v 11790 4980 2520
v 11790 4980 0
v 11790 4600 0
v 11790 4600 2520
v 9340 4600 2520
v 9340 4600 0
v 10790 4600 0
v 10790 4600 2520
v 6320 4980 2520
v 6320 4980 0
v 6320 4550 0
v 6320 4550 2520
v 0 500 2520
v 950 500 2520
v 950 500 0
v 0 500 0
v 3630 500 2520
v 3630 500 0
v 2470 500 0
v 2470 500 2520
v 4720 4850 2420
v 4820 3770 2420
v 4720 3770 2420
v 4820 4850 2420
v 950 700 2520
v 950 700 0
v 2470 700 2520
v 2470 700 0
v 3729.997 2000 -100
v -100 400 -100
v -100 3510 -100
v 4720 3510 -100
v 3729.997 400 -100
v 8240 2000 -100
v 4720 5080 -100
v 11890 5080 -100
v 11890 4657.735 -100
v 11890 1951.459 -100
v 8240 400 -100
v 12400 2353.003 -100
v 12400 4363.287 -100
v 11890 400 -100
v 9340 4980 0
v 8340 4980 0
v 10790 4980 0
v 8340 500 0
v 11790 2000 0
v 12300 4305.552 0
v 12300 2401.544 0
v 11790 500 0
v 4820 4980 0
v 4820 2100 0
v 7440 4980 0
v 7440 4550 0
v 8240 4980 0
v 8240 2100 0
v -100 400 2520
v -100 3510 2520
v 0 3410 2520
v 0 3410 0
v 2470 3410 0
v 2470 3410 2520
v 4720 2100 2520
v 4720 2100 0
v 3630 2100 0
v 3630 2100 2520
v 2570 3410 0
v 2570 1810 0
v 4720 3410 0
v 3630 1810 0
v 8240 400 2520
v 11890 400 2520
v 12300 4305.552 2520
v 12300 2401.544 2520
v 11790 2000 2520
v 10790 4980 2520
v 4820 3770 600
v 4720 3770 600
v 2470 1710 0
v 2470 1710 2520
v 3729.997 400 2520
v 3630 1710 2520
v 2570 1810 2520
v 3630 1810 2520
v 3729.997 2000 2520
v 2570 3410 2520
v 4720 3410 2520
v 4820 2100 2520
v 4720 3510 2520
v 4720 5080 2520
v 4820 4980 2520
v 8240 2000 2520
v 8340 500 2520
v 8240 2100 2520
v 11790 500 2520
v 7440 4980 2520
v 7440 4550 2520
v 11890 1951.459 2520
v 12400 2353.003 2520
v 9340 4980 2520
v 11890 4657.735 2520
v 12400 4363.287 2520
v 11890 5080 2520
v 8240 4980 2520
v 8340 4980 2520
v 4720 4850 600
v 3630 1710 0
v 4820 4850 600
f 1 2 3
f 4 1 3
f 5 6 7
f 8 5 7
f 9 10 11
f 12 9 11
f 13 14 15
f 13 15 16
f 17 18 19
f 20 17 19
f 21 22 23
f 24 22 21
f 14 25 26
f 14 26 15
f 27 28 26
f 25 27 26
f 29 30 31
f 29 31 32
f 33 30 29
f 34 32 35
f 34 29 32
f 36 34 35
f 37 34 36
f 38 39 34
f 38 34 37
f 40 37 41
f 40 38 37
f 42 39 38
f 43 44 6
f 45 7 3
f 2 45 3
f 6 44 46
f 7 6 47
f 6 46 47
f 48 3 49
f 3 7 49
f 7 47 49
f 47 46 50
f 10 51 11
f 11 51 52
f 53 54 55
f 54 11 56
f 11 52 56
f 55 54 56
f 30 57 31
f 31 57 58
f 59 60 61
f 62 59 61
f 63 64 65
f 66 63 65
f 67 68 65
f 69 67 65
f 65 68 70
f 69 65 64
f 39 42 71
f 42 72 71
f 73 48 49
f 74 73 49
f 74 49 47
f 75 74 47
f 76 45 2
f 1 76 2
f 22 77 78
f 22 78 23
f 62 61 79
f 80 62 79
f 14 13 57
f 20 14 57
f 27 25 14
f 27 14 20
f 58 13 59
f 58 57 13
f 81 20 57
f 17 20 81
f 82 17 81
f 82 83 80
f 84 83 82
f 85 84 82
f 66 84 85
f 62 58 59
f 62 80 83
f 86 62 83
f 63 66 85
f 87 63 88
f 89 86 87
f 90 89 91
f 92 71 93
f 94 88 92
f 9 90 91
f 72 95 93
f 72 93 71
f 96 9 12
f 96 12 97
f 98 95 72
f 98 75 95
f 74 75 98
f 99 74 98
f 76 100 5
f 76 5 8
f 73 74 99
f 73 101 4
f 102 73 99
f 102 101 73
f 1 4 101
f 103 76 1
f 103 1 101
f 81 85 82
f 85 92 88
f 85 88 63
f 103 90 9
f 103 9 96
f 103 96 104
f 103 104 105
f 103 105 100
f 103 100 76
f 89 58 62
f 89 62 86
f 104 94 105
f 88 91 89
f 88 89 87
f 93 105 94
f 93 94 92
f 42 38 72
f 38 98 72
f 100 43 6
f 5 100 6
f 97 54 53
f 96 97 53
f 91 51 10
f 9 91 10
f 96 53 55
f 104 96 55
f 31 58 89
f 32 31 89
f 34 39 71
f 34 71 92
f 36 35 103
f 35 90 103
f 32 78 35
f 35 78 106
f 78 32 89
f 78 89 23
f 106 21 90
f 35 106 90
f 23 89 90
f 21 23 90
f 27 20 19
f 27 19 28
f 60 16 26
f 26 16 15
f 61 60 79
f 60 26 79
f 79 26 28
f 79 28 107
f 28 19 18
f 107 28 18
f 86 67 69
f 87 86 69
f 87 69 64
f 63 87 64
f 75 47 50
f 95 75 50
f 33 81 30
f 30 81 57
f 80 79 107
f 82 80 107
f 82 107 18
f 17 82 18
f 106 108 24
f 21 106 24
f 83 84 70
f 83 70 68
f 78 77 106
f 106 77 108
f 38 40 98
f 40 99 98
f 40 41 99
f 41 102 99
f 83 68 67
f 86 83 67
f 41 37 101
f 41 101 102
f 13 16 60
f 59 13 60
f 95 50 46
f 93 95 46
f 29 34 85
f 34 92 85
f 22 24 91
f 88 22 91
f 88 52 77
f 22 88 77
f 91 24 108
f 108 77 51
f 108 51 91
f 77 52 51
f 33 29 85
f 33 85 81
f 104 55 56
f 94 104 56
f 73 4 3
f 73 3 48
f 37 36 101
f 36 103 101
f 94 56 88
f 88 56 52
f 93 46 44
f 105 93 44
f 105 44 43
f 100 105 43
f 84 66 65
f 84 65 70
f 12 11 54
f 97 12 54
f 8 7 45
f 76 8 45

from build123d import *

# Parameters (mm, degrees)
F1_DEPTH = 2520
F3_DEPTH = 100
F4_W     = 1080
F4_H     = 1820
F5_DEPTH = 100


with BuildPart() as f1:
    # F0 (on Top) → F1 (new body)
    with BuildSketch(Plane.XY):
        Polygon((-100.000001, 3510.000185), (-100.000001, 400.000185), (3250.000037, 400.000185), (3729.997109, 400.000185), (3729.997109, 2000), (4719.99711, 2000), (8240, 2000), (8240, 400.000185), (8316.840935, 400.000185), (11890, 400.000185), (11890, 1951.458778), (12400, 2353.002888), (12400, 4363.286575), (11890, 4657.735212), (11890, 5080.000185), (11790, 5080.000185), (4720, 5080.000185), (4720, 4980.000185), (4720, 3510.000185), (2569.999999, 3510.000185), align=None)
        Polygon((949.999999, 500.000185), (-1e-06, 500.000185), (-1e-06, 3410.000185), (2469.999999, 3410.000185), (2469.999999, 1910.000185), (2469.999999, 1810.000185), (2469.999999, 1710.000185), (2569.999999, 1710.000185), (3629.999999, 1710.000185), (3629.999999, 500.000185), (2469.999999, 500.000185), (2469.999999, 700.000185), (949.999999, 700.000185), align=None, mode=Mode.SUBTRACT)
        Polygon((2569.999999, 3410.000185), (4720, 3410.000185), (4720, 3010), (4720, 2100.000185), (3629.999999, 2100.000185), (3629.999999, 1810.000185), (2569.999999, 1810.000185), align=None, mode=Mode.SUBTRACT)
        Polygon((8240, 2100.000185), (4820, 2100.000185), (4820, 4980.000185), (6320, 4980.000185), (6320, 4550.000185), (7440, 4550.000185), (7440, 4980.000185), (8240, 4980.000185), align=None, mode=Mode.SUBTRACT)
        Polygon((8340, 500.000185), (8340, 4980.000185), (9340, 4980.000185), (9340, 4600.000185), (10790, 4600.000185), (10790, 4980.000185), (11790, 4980.000185), (11790, 4600.000185), (12300, 4305.551548), (12300, 2401.544295), (11790, 2000.000185), (11790, 500.000185), align=None, mode=Mode.SUBTRACT)
    extrude(amount=F1_DEPTH)

    # F2 (on face) → F3 (join)
    with BuildSketch(Plane(origin=(0, 0, 0), x_dir=(1, 0, 0), z_dir=(0, 0, -1))):
        Polygon((4720, -3510.000185), (4720, -5080.000185), (11890, -5080.000185), (11890, -4657.735212), (12400, -4363.286575), (12400, -2353.002888), (11890, -1951.458778), (11890, -400.000185), (8240, -400.000185), (8240, -2000), (3729.997109, -2000), (3729.997109, -400.000185), (-100.000001, -400.000185), (-100.000001, -3510.000185), align=None)
    extrude(amount=F3_DEPTH)

    # F4 (on face) → F5 (cut, through all)
    with BuildSketch(Plane.YZ.offset(4820)):
        with Locations((4310.000185, 1510)):
            Rectangle(F4_W, F4_H)
    extrude(amount=-F5_DEPTH, mode=Mode.SUBTRACT)


solid = f1.part
